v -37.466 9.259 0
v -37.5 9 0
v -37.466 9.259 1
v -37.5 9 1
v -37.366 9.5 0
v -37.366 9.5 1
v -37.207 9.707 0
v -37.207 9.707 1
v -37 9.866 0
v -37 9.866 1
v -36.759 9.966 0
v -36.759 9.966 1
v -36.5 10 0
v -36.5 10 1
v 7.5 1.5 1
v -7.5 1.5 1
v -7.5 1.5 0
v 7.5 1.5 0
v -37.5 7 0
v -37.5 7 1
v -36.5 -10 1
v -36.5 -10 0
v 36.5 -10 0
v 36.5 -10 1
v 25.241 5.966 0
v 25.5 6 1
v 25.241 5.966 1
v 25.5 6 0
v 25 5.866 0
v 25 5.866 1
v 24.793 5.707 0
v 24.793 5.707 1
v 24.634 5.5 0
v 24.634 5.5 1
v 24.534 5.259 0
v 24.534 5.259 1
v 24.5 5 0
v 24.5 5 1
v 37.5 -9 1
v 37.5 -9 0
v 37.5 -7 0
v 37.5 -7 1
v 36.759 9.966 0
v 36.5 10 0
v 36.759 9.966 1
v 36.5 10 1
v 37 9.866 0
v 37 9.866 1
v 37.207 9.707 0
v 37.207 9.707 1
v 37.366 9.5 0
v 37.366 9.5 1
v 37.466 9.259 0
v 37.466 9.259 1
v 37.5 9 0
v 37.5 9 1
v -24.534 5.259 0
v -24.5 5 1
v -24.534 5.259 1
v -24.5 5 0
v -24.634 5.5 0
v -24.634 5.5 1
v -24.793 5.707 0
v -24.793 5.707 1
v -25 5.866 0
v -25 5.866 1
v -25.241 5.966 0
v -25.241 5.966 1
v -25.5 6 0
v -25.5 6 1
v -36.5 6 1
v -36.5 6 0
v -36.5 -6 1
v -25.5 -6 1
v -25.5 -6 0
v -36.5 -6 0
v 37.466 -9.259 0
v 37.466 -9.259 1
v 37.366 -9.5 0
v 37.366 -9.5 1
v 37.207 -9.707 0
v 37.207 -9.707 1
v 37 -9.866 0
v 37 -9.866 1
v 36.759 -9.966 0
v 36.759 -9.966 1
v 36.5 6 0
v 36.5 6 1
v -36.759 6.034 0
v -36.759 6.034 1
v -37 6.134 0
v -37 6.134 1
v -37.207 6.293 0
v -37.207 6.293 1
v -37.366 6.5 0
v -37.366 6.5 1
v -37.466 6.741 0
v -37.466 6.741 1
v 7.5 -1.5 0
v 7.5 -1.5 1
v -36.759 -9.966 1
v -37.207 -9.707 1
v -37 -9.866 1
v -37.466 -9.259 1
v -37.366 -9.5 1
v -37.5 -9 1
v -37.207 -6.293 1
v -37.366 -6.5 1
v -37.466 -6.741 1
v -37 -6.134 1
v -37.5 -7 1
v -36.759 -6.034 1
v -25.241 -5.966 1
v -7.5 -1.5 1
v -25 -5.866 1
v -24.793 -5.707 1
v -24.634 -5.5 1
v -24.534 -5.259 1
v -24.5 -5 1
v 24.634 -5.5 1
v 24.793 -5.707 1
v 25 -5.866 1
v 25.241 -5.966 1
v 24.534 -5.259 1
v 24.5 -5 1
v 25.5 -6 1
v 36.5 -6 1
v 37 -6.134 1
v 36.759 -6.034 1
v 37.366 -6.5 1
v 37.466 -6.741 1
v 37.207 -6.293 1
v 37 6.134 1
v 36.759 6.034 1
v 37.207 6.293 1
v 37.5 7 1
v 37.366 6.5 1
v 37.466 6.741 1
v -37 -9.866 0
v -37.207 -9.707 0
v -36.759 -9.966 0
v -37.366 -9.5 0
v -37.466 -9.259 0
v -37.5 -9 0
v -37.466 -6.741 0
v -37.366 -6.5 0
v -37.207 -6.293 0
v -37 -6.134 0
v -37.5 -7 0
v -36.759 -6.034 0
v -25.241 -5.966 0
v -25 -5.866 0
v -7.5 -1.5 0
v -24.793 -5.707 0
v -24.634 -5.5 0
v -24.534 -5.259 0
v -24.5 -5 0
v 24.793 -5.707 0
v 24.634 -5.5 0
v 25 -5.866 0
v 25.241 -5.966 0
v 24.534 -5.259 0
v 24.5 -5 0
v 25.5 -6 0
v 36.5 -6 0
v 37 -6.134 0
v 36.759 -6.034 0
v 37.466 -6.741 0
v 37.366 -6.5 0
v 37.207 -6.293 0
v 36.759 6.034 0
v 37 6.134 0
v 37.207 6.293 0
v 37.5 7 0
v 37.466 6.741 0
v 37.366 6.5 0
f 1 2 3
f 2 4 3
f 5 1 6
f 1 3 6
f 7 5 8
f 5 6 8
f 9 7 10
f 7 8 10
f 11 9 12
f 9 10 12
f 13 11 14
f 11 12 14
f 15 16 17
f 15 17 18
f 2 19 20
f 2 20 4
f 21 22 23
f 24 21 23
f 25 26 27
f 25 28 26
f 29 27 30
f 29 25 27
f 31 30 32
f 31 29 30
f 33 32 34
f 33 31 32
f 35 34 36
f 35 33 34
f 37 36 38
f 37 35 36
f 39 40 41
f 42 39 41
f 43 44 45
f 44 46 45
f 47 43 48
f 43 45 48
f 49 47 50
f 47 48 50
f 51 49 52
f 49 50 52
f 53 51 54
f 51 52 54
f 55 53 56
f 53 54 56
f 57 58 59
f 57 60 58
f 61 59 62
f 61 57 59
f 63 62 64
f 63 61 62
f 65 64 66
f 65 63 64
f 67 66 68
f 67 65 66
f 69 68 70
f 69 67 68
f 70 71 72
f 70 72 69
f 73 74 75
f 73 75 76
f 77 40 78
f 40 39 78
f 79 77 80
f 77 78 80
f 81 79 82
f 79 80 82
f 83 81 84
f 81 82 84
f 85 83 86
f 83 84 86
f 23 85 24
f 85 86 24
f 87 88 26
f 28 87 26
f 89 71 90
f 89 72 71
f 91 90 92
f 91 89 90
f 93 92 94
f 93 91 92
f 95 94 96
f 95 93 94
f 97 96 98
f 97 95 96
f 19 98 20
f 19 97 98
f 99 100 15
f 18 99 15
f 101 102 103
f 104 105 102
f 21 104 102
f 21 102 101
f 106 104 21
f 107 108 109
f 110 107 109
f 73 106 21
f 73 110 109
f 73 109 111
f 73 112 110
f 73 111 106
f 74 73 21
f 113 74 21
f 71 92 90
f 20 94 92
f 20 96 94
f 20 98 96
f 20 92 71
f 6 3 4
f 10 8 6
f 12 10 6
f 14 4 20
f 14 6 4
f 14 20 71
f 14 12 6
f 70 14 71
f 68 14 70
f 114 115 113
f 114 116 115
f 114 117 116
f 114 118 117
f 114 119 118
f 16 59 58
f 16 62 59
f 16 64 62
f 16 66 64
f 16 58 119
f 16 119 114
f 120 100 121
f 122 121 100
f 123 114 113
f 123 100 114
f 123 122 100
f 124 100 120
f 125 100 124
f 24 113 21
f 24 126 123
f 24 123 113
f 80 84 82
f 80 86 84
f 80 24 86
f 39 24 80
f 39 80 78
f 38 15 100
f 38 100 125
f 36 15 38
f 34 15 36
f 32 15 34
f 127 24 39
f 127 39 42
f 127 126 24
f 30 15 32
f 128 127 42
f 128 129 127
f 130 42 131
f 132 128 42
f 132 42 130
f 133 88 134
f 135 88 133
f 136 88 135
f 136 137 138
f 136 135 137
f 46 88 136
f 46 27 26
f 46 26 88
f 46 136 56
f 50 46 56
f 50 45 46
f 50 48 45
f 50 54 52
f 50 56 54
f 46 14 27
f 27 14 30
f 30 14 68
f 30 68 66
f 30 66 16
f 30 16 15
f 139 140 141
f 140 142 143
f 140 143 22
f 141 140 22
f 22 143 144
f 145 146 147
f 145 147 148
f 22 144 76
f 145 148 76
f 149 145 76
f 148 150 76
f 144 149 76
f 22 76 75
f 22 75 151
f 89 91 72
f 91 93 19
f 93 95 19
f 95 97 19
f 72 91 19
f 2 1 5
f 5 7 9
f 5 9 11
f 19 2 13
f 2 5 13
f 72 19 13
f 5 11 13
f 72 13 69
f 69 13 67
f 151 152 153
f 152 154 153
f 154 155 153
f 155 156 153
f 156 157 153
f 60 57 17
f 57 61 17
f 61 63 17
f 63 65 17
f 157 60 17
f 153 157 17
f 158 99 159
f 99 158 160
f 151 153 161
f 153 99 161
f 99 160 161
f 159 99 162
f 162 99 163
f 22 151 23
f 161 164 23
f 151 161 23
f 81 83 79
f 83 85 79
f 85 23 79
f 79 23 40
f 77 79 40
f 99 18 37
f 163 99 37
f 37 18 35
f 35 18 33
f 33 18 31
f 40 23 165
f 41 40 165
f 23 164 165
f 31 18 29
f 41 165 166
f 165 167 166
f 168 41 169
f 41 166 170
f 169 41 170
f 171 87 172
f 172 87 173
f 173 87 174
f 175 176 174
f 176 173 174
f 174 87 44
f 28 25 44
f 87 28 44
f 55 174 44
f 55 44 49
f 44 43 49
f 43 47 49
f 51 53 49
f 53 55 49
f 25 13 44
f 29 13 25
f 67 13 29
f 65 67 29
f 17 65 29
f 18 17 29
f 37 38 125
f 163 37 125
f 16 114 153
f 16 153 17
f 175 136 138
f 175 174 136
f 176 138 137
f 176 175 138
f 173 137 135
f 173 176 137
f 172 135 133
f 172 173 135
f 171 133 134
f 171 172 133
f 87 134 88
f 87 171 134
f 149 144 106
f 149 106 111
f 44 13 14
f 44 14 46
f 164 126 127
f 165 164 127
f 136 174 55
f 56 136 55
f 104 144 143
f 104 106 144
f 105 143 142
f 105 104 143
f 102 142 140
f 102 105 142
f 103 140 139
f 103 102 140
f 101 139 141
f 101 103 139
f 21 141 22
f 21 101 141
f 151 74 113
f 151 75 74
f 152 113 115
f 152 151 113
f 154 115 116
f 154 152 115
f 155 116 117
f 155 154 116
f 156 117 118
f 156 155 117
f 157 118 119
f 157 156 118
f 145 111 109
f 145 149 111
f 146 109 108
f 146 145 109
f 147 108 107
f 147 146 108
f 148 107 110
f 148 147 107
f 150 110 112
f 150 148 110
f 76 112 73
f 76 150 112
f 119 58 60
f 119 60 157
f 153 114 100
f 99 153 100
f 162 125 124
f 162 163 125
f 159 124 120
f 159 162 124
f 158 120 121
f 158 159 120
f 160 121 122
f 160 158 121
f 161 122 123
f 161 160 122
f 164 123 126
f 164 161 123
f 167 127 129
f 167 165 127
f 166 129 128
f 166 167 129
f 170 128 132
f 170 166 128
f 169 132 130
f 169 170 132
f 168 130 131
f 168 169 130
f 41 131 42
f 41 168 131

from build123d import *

# Parameters (mm, degrees)
SKETCH1_W           = 75
SKETCH1_H           = 20
BOSS_EXTRUDE1_DEPTH = 1
CUT_EXTRUDE1_DEPTH  = 39.823317736
FILLET1_R           = 1
FILLET2_R           = 1
SKETCH3_W           = 15
SKETCH3_H           = 3
CUT_EXTRUDE2_DEPTH  = 1.25


with BuildPart() as part:
    # Sketch1 → Boss-Extrude1 (new body)
    with BuildSketch(Plane.XY):
        Rectangle(SKETCH1_W, SKETCH1_H)
    extrude(amount=BOSS_EXTRUDE1_DEPTH)

    # Sketch2 → Cut-Extrude1 (cut, through all)
    with BuildSketch(Plane.XY.offset(1)):
        with BuildLine():
            Line((-37.5, 6), (-24.5, 6))
            Line((-24.5, 6), (-24.5, -6))
            Line((-24.5, -6), (-37.5, -6))
            ThreePointArc((-37.5, -6), (-43.5, 0), (-37.5, 6))
        make_face()
    cut_extrude1 = extrude(amount=-CUT_EXTRUDE1_DEPTH, mode=Mode.SUBTRACT)

    # Fillet1
    fillet1_edges = [part.edges().sort_by_distance(p)[0] for p in [
        (-37.5, -6, 0.5),
        (-37.5, 6, 0.5),
        (-24.5, 6, 0.5),
        (-24.5, -6, 0.5),
        (-37.5, 10, 0.5),
        (-37.5, -10, 0.5),
    ]]
    fillet(fillet1_edges, radius=FILLET1_R)

    # Mirror1: Cut-Extrude1 across plane
    add(cut_extrude1.mirror(Plane(origin=(0, 0, 0), x_dir=(0, 0, 1), z_dir=(1, 0, 0))), mode=Mode.SUBTRACT)

    # Fillet2
    fillet2_edges = [part.edges().sort_by_distance(p)[0] for p in [
        (37.5, 6, 0.5),
        (37.5, -6, 0.5),
        (24.5, -6, 0.5),
        (24.5, 6, 0.5),
        (37.5, 10, 0.5),
        (37.5, -10, 0.5),
    ]]
    fillet(fillet2_edges, radius=FILLET2_R)

    # Sketch3 → Cut-Extrude2 (cut)
    with BuildSketch(Plane.XY.offset(1)):
        Rectangle(SKETCH3_W, SKETCH3_H)
    extrude(amount=-CUT_EXTRUDE2_DEPTH, mode=Mode.SUBTRACT)


solid = part.part
